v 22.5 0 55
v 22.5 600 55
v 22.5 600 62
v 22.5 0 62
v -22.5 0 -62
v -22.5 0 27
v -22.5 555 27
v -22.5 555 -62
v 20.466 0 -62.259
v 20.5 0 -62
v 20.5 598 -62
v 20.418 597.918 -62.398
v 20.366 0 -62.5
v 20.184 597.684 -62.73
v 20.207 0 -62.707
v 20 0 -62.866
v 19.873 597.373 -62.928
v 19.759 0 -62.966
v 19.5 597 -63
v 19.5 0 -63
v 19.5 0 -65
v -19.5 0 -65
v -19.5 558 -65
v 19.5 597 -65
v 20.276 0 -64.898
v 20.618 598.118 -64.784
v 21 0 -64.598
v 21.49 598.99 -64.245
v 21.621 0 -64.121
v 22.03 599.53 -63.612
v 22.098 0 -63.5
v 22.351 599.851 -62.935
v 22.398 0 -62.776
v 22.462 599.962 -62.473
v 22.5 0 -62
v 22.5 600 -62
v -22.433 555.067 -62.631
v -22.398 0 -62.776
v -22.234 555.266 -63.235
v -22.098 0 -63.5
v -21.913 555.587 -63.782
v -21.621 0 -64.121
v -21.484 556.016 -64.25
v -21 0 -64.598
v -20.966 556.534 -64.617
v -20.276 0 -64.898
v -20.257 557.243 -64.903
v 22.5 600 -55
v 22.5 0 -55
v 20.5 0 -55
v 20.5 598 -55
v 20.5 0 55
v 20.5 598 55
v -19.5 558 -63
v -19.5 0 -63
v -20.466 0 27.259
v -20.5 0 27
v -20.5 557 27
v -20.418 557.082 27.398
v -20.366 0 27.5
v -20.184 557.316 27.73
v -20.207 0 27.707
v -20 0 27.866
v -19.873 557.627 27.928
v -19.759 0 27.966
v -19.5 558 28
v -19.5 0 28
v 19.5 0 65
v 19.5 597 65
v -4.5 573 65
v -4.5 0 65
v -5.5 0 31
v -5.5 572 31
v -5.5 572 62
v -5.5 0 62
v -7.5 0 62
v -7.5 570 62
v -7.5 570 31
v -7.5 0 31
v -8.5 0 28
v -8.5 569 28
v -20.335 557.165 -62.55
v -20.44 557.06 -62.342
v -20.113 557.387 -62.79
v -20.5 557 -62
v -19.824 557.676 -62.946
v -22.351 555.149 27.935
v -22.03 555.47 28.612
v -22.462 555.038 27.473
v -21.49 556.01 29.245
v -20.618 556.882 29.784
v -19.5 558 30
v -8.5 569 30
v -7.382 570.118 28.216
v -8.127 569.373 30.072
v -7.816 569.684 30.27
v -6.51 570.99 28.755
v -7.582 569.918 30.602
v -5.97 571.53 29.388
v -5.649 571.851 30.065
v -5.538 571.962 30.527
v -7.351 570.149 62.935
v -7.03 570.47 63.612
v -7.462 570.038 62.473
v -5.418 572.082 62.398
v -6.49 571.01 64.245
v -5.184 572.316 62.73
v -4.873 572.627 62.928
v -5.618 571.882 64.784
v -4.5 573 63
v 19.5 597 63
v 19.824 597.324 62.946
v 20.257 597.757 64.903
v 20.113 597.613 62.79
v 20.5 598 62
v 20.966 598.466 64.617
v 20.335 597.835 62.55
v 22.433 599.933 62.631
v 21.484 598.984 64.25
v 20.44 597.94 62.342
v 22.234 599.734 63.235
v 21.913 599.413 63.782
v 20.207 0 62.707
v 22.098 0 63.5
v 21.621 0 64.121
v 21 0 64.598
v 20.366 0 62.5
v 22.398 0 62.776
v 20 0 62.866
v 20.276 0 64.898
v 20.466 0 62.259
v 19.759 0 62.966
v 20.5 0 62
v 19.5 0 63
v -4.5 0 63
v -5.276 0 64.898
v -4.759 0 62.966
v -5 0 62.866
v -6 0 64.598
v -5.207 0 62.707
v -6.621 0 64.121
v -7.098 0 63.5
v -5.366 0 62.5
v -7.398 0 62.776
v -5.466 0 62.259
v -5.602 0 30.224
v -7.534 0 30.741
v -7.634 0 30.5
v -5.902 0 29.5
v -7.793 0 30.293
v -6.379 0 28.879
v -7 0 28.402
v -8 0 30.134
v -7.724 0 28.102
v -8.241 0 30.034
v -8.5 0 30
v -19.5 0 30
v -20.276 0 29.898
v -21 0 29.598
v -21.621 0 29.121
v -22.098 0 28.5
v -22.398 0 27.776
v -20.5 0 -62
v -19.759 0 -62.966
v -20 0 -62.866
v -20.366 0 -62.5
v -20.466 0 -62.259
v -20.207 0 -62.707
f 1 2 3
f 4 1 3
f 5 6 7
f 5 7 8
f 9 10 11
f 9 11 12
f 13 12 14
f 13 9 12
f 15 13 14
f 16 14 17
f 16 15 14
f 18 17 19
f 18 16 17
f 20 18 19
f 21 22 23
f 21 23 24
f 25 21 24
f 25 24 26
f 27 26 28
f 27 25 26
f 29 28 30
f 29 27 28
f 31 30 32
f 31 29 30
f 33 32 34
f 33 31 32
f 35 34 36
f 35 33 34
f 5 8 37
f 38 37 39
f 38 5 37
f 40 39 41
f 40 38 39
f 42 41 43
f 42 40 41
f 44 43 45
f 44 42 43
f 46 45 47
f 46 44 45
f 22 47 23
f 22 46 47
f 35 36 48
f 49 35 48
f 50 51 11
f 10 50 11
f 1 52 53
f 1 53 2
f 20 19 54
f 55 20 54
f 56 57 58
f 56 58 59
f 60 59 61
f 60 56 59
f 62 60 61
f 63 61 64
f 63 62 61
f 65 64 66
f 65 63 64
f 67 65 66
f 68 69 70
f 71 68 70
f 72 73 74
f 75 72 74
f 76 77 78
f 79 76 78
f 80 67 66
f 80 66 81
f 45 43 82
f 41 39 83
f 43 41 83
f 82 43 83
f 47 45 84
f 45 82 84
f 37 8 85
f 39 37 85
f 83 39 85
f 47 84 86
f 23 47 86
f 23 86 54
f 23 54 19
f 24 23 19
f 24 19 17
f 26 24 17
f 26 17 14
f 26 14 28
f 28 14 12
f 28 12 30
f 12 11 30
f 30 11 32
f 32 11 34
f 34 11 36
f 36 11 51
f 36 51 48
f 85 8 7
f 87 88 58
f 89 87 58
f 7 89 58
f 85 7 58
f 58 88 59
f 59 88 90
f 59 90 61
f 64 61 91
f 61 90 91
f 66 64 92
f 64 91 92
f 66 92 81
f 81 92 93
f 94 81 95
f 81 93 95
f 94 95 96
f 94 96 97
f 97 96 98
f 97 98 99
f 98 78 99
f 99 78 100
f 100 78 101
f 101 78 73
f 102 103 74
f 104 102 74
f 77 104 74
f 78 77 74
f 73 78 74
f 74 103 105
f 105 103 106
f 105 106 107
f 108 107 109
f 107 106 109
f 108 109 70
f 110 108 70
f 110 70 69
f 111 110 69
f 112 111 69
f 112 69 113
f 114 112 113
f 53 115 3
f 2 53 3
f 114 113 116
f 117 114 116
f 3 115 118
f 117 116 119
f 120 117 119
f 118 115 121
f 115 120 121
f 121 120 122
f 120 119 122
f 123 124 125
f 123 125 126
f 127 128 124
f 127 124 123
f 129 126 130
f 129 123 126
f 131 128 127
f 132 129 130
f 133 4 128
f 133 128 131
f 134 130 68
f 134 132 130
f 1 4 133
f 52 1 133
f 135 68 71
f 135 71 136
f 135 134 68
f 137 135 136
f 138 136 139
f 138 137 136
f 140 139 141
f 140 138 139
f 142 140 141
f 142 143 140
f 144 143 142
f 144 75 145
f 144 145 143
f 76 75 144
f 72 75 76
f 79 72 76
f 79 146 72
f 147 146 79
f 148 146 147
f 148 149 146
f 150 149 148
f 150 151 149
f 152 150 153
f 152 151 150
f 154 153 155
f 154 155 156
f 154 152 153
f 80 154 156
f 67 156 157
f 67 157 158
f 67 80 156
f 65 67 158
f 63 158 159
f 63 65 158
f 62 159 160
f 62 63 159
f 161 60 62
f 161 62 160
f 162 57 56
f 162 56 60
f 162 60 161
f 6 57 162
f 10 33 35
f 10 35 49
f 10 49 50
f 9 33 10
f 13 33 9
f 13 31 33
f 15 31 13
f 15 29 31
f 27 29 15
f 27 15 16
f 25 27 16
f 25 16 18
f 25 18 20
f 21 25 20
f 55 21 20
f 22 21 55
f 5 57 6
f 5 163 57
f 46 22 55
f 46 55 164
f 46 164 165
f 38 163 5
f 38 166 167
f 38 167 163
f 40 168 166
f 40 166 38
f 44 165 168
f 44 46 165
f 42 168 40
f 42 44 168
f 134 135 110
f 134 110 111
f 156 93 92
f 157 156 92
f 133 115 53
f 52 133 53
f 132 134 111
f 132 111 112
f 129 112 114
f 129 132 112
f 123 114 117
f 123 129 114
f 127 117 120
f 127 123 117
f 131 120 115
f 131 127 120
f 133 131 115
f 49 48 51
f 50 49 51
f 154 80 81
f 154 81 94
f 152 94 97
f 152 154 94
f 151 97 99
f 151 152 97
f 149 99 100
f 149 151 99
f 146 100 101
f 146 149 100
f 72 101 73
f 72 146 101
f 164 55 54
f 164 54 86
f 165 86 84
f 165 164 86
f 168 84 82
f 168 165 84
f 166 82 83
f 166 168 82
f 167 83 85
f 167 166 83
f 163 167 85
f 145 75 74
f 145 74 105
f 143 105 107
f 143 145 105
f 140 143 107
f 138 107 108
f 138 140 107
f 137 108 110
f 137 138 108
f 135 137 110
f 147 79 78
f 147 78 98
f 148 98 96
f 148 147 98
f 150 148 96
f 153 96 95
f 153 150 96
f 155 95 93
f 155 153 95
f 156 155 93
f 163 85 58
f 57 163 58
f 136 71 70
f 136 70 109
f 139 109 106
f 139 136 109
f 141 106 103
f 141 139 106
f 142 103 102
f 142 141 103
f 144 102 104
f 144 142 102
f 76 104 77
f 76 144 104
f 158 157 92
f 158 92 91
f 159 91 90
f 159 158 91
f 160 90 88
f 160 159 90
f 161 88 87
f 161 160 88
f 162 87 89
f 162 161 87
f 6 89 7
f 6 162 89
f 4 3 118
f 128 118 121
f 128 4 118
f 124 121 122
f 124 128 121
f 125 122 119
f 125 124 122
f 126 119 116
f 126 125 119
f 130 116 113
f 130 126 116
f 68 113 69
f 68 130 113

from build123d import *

# Parameters (mm, degrees)
VYSUNOUT_TENKOST_NN_1_DEPTH = 600
ODEBRAT_VYSUNUT_M1_DEPTH    = 130


with BuildPart() as part:
    # Skica1 → Vysunout tenkostěnný1 (new body)
    with BuildSketch(Plane(origin=(0, 0, 0), x_dir=(1, 0, 0), z_dir=(0, 1, 0))):
        with BuildLine():
            Line((22.5, -55), (22.5, -62))
            ThreePointArc((22.5, -62), (21.621320344, -64.121320344), (19.5, -65))
            Line((19.5, -65), (-4.5, -65))
            ThreePointArc((-4.5, -65), (-6.621320344, -64.121320344), (-7.5, -62))
            Line((-7.5, -62), (-7.5, -31))
            ThreePointArc((-7.5, -31), (-7.792893219, -30.292893219), (-8.5, -30))
            Line((-8.5, -30), (-19.5, -30))
            ThreePointArc((-19.5, -30), (-21.621320344, -29.121320344), (-22.5, -27))
            Line((-22.5, -27), (-22.5, 62))
            ThreePointArc((-22.5, 62), (-21.621320344, 64.121320344), (-19.5, 65))
            Line((-19.5, 65), (19.5, 65))
            ThreePointArc((19.5, 65), (21.621320344, 64.121320344), (22.5, 62))
            Line((22.5, 62), (22.5, 55))
            Line((22.5, 55), (20.5, 55))
            Line((20.5, 55), (20.5, 62))
            ThreePointArc((20.5, 62), (20.207106781, 62.707106781), (19.5, 63))
            Line((19.5, 63), (-19.5, 63))
            ThreePointArc((-19.5, 63), (-20.207106781, 62.707106781), (-20.5, 62))
            Line((-20.5, 62), (-20.5, -27))
            ThreePointArc((-20.5, -27), (-20.207106781, -27.707106781), (-19.5, -28))
            Line((-19.5, -28), (-8.5, -28))
            ThreePointArc((-8.5, -28), (-6.378679656, -28.878679656), (-5.5, -31))
            Line((-5.5, -31), (-5.5, -62))
            ThreePointArc((-5.5, -62), (-5.207106781, -62.707106781), (-4.5, -63))
            Line((-4.5, -63), (19.5, -63))
            ThreePointArc((19.5, -63), (20.207106781, -62.707106781), (20.5, -62))
            Line((20.5, -62), (20.5, -55))
            Line((20.5, -55), (22.5, -55))
        make_face()
    extrude(amount=VYSUNOUT_TENKOST_NN_1_DEPTH)

    # Skica2 → Odebrat vysunutím1 (cut)
    with BuildSketch(Plane.XY.offset(65)):
        Polygon((22.5, 600), (-22.5, 600), (-22.5, 555), align=None)
    extrude(amount=-ODEBRAT_VYSUNUT_M1_DEPTH, mode=Mode.SUBTRACT)


solid = part.part
